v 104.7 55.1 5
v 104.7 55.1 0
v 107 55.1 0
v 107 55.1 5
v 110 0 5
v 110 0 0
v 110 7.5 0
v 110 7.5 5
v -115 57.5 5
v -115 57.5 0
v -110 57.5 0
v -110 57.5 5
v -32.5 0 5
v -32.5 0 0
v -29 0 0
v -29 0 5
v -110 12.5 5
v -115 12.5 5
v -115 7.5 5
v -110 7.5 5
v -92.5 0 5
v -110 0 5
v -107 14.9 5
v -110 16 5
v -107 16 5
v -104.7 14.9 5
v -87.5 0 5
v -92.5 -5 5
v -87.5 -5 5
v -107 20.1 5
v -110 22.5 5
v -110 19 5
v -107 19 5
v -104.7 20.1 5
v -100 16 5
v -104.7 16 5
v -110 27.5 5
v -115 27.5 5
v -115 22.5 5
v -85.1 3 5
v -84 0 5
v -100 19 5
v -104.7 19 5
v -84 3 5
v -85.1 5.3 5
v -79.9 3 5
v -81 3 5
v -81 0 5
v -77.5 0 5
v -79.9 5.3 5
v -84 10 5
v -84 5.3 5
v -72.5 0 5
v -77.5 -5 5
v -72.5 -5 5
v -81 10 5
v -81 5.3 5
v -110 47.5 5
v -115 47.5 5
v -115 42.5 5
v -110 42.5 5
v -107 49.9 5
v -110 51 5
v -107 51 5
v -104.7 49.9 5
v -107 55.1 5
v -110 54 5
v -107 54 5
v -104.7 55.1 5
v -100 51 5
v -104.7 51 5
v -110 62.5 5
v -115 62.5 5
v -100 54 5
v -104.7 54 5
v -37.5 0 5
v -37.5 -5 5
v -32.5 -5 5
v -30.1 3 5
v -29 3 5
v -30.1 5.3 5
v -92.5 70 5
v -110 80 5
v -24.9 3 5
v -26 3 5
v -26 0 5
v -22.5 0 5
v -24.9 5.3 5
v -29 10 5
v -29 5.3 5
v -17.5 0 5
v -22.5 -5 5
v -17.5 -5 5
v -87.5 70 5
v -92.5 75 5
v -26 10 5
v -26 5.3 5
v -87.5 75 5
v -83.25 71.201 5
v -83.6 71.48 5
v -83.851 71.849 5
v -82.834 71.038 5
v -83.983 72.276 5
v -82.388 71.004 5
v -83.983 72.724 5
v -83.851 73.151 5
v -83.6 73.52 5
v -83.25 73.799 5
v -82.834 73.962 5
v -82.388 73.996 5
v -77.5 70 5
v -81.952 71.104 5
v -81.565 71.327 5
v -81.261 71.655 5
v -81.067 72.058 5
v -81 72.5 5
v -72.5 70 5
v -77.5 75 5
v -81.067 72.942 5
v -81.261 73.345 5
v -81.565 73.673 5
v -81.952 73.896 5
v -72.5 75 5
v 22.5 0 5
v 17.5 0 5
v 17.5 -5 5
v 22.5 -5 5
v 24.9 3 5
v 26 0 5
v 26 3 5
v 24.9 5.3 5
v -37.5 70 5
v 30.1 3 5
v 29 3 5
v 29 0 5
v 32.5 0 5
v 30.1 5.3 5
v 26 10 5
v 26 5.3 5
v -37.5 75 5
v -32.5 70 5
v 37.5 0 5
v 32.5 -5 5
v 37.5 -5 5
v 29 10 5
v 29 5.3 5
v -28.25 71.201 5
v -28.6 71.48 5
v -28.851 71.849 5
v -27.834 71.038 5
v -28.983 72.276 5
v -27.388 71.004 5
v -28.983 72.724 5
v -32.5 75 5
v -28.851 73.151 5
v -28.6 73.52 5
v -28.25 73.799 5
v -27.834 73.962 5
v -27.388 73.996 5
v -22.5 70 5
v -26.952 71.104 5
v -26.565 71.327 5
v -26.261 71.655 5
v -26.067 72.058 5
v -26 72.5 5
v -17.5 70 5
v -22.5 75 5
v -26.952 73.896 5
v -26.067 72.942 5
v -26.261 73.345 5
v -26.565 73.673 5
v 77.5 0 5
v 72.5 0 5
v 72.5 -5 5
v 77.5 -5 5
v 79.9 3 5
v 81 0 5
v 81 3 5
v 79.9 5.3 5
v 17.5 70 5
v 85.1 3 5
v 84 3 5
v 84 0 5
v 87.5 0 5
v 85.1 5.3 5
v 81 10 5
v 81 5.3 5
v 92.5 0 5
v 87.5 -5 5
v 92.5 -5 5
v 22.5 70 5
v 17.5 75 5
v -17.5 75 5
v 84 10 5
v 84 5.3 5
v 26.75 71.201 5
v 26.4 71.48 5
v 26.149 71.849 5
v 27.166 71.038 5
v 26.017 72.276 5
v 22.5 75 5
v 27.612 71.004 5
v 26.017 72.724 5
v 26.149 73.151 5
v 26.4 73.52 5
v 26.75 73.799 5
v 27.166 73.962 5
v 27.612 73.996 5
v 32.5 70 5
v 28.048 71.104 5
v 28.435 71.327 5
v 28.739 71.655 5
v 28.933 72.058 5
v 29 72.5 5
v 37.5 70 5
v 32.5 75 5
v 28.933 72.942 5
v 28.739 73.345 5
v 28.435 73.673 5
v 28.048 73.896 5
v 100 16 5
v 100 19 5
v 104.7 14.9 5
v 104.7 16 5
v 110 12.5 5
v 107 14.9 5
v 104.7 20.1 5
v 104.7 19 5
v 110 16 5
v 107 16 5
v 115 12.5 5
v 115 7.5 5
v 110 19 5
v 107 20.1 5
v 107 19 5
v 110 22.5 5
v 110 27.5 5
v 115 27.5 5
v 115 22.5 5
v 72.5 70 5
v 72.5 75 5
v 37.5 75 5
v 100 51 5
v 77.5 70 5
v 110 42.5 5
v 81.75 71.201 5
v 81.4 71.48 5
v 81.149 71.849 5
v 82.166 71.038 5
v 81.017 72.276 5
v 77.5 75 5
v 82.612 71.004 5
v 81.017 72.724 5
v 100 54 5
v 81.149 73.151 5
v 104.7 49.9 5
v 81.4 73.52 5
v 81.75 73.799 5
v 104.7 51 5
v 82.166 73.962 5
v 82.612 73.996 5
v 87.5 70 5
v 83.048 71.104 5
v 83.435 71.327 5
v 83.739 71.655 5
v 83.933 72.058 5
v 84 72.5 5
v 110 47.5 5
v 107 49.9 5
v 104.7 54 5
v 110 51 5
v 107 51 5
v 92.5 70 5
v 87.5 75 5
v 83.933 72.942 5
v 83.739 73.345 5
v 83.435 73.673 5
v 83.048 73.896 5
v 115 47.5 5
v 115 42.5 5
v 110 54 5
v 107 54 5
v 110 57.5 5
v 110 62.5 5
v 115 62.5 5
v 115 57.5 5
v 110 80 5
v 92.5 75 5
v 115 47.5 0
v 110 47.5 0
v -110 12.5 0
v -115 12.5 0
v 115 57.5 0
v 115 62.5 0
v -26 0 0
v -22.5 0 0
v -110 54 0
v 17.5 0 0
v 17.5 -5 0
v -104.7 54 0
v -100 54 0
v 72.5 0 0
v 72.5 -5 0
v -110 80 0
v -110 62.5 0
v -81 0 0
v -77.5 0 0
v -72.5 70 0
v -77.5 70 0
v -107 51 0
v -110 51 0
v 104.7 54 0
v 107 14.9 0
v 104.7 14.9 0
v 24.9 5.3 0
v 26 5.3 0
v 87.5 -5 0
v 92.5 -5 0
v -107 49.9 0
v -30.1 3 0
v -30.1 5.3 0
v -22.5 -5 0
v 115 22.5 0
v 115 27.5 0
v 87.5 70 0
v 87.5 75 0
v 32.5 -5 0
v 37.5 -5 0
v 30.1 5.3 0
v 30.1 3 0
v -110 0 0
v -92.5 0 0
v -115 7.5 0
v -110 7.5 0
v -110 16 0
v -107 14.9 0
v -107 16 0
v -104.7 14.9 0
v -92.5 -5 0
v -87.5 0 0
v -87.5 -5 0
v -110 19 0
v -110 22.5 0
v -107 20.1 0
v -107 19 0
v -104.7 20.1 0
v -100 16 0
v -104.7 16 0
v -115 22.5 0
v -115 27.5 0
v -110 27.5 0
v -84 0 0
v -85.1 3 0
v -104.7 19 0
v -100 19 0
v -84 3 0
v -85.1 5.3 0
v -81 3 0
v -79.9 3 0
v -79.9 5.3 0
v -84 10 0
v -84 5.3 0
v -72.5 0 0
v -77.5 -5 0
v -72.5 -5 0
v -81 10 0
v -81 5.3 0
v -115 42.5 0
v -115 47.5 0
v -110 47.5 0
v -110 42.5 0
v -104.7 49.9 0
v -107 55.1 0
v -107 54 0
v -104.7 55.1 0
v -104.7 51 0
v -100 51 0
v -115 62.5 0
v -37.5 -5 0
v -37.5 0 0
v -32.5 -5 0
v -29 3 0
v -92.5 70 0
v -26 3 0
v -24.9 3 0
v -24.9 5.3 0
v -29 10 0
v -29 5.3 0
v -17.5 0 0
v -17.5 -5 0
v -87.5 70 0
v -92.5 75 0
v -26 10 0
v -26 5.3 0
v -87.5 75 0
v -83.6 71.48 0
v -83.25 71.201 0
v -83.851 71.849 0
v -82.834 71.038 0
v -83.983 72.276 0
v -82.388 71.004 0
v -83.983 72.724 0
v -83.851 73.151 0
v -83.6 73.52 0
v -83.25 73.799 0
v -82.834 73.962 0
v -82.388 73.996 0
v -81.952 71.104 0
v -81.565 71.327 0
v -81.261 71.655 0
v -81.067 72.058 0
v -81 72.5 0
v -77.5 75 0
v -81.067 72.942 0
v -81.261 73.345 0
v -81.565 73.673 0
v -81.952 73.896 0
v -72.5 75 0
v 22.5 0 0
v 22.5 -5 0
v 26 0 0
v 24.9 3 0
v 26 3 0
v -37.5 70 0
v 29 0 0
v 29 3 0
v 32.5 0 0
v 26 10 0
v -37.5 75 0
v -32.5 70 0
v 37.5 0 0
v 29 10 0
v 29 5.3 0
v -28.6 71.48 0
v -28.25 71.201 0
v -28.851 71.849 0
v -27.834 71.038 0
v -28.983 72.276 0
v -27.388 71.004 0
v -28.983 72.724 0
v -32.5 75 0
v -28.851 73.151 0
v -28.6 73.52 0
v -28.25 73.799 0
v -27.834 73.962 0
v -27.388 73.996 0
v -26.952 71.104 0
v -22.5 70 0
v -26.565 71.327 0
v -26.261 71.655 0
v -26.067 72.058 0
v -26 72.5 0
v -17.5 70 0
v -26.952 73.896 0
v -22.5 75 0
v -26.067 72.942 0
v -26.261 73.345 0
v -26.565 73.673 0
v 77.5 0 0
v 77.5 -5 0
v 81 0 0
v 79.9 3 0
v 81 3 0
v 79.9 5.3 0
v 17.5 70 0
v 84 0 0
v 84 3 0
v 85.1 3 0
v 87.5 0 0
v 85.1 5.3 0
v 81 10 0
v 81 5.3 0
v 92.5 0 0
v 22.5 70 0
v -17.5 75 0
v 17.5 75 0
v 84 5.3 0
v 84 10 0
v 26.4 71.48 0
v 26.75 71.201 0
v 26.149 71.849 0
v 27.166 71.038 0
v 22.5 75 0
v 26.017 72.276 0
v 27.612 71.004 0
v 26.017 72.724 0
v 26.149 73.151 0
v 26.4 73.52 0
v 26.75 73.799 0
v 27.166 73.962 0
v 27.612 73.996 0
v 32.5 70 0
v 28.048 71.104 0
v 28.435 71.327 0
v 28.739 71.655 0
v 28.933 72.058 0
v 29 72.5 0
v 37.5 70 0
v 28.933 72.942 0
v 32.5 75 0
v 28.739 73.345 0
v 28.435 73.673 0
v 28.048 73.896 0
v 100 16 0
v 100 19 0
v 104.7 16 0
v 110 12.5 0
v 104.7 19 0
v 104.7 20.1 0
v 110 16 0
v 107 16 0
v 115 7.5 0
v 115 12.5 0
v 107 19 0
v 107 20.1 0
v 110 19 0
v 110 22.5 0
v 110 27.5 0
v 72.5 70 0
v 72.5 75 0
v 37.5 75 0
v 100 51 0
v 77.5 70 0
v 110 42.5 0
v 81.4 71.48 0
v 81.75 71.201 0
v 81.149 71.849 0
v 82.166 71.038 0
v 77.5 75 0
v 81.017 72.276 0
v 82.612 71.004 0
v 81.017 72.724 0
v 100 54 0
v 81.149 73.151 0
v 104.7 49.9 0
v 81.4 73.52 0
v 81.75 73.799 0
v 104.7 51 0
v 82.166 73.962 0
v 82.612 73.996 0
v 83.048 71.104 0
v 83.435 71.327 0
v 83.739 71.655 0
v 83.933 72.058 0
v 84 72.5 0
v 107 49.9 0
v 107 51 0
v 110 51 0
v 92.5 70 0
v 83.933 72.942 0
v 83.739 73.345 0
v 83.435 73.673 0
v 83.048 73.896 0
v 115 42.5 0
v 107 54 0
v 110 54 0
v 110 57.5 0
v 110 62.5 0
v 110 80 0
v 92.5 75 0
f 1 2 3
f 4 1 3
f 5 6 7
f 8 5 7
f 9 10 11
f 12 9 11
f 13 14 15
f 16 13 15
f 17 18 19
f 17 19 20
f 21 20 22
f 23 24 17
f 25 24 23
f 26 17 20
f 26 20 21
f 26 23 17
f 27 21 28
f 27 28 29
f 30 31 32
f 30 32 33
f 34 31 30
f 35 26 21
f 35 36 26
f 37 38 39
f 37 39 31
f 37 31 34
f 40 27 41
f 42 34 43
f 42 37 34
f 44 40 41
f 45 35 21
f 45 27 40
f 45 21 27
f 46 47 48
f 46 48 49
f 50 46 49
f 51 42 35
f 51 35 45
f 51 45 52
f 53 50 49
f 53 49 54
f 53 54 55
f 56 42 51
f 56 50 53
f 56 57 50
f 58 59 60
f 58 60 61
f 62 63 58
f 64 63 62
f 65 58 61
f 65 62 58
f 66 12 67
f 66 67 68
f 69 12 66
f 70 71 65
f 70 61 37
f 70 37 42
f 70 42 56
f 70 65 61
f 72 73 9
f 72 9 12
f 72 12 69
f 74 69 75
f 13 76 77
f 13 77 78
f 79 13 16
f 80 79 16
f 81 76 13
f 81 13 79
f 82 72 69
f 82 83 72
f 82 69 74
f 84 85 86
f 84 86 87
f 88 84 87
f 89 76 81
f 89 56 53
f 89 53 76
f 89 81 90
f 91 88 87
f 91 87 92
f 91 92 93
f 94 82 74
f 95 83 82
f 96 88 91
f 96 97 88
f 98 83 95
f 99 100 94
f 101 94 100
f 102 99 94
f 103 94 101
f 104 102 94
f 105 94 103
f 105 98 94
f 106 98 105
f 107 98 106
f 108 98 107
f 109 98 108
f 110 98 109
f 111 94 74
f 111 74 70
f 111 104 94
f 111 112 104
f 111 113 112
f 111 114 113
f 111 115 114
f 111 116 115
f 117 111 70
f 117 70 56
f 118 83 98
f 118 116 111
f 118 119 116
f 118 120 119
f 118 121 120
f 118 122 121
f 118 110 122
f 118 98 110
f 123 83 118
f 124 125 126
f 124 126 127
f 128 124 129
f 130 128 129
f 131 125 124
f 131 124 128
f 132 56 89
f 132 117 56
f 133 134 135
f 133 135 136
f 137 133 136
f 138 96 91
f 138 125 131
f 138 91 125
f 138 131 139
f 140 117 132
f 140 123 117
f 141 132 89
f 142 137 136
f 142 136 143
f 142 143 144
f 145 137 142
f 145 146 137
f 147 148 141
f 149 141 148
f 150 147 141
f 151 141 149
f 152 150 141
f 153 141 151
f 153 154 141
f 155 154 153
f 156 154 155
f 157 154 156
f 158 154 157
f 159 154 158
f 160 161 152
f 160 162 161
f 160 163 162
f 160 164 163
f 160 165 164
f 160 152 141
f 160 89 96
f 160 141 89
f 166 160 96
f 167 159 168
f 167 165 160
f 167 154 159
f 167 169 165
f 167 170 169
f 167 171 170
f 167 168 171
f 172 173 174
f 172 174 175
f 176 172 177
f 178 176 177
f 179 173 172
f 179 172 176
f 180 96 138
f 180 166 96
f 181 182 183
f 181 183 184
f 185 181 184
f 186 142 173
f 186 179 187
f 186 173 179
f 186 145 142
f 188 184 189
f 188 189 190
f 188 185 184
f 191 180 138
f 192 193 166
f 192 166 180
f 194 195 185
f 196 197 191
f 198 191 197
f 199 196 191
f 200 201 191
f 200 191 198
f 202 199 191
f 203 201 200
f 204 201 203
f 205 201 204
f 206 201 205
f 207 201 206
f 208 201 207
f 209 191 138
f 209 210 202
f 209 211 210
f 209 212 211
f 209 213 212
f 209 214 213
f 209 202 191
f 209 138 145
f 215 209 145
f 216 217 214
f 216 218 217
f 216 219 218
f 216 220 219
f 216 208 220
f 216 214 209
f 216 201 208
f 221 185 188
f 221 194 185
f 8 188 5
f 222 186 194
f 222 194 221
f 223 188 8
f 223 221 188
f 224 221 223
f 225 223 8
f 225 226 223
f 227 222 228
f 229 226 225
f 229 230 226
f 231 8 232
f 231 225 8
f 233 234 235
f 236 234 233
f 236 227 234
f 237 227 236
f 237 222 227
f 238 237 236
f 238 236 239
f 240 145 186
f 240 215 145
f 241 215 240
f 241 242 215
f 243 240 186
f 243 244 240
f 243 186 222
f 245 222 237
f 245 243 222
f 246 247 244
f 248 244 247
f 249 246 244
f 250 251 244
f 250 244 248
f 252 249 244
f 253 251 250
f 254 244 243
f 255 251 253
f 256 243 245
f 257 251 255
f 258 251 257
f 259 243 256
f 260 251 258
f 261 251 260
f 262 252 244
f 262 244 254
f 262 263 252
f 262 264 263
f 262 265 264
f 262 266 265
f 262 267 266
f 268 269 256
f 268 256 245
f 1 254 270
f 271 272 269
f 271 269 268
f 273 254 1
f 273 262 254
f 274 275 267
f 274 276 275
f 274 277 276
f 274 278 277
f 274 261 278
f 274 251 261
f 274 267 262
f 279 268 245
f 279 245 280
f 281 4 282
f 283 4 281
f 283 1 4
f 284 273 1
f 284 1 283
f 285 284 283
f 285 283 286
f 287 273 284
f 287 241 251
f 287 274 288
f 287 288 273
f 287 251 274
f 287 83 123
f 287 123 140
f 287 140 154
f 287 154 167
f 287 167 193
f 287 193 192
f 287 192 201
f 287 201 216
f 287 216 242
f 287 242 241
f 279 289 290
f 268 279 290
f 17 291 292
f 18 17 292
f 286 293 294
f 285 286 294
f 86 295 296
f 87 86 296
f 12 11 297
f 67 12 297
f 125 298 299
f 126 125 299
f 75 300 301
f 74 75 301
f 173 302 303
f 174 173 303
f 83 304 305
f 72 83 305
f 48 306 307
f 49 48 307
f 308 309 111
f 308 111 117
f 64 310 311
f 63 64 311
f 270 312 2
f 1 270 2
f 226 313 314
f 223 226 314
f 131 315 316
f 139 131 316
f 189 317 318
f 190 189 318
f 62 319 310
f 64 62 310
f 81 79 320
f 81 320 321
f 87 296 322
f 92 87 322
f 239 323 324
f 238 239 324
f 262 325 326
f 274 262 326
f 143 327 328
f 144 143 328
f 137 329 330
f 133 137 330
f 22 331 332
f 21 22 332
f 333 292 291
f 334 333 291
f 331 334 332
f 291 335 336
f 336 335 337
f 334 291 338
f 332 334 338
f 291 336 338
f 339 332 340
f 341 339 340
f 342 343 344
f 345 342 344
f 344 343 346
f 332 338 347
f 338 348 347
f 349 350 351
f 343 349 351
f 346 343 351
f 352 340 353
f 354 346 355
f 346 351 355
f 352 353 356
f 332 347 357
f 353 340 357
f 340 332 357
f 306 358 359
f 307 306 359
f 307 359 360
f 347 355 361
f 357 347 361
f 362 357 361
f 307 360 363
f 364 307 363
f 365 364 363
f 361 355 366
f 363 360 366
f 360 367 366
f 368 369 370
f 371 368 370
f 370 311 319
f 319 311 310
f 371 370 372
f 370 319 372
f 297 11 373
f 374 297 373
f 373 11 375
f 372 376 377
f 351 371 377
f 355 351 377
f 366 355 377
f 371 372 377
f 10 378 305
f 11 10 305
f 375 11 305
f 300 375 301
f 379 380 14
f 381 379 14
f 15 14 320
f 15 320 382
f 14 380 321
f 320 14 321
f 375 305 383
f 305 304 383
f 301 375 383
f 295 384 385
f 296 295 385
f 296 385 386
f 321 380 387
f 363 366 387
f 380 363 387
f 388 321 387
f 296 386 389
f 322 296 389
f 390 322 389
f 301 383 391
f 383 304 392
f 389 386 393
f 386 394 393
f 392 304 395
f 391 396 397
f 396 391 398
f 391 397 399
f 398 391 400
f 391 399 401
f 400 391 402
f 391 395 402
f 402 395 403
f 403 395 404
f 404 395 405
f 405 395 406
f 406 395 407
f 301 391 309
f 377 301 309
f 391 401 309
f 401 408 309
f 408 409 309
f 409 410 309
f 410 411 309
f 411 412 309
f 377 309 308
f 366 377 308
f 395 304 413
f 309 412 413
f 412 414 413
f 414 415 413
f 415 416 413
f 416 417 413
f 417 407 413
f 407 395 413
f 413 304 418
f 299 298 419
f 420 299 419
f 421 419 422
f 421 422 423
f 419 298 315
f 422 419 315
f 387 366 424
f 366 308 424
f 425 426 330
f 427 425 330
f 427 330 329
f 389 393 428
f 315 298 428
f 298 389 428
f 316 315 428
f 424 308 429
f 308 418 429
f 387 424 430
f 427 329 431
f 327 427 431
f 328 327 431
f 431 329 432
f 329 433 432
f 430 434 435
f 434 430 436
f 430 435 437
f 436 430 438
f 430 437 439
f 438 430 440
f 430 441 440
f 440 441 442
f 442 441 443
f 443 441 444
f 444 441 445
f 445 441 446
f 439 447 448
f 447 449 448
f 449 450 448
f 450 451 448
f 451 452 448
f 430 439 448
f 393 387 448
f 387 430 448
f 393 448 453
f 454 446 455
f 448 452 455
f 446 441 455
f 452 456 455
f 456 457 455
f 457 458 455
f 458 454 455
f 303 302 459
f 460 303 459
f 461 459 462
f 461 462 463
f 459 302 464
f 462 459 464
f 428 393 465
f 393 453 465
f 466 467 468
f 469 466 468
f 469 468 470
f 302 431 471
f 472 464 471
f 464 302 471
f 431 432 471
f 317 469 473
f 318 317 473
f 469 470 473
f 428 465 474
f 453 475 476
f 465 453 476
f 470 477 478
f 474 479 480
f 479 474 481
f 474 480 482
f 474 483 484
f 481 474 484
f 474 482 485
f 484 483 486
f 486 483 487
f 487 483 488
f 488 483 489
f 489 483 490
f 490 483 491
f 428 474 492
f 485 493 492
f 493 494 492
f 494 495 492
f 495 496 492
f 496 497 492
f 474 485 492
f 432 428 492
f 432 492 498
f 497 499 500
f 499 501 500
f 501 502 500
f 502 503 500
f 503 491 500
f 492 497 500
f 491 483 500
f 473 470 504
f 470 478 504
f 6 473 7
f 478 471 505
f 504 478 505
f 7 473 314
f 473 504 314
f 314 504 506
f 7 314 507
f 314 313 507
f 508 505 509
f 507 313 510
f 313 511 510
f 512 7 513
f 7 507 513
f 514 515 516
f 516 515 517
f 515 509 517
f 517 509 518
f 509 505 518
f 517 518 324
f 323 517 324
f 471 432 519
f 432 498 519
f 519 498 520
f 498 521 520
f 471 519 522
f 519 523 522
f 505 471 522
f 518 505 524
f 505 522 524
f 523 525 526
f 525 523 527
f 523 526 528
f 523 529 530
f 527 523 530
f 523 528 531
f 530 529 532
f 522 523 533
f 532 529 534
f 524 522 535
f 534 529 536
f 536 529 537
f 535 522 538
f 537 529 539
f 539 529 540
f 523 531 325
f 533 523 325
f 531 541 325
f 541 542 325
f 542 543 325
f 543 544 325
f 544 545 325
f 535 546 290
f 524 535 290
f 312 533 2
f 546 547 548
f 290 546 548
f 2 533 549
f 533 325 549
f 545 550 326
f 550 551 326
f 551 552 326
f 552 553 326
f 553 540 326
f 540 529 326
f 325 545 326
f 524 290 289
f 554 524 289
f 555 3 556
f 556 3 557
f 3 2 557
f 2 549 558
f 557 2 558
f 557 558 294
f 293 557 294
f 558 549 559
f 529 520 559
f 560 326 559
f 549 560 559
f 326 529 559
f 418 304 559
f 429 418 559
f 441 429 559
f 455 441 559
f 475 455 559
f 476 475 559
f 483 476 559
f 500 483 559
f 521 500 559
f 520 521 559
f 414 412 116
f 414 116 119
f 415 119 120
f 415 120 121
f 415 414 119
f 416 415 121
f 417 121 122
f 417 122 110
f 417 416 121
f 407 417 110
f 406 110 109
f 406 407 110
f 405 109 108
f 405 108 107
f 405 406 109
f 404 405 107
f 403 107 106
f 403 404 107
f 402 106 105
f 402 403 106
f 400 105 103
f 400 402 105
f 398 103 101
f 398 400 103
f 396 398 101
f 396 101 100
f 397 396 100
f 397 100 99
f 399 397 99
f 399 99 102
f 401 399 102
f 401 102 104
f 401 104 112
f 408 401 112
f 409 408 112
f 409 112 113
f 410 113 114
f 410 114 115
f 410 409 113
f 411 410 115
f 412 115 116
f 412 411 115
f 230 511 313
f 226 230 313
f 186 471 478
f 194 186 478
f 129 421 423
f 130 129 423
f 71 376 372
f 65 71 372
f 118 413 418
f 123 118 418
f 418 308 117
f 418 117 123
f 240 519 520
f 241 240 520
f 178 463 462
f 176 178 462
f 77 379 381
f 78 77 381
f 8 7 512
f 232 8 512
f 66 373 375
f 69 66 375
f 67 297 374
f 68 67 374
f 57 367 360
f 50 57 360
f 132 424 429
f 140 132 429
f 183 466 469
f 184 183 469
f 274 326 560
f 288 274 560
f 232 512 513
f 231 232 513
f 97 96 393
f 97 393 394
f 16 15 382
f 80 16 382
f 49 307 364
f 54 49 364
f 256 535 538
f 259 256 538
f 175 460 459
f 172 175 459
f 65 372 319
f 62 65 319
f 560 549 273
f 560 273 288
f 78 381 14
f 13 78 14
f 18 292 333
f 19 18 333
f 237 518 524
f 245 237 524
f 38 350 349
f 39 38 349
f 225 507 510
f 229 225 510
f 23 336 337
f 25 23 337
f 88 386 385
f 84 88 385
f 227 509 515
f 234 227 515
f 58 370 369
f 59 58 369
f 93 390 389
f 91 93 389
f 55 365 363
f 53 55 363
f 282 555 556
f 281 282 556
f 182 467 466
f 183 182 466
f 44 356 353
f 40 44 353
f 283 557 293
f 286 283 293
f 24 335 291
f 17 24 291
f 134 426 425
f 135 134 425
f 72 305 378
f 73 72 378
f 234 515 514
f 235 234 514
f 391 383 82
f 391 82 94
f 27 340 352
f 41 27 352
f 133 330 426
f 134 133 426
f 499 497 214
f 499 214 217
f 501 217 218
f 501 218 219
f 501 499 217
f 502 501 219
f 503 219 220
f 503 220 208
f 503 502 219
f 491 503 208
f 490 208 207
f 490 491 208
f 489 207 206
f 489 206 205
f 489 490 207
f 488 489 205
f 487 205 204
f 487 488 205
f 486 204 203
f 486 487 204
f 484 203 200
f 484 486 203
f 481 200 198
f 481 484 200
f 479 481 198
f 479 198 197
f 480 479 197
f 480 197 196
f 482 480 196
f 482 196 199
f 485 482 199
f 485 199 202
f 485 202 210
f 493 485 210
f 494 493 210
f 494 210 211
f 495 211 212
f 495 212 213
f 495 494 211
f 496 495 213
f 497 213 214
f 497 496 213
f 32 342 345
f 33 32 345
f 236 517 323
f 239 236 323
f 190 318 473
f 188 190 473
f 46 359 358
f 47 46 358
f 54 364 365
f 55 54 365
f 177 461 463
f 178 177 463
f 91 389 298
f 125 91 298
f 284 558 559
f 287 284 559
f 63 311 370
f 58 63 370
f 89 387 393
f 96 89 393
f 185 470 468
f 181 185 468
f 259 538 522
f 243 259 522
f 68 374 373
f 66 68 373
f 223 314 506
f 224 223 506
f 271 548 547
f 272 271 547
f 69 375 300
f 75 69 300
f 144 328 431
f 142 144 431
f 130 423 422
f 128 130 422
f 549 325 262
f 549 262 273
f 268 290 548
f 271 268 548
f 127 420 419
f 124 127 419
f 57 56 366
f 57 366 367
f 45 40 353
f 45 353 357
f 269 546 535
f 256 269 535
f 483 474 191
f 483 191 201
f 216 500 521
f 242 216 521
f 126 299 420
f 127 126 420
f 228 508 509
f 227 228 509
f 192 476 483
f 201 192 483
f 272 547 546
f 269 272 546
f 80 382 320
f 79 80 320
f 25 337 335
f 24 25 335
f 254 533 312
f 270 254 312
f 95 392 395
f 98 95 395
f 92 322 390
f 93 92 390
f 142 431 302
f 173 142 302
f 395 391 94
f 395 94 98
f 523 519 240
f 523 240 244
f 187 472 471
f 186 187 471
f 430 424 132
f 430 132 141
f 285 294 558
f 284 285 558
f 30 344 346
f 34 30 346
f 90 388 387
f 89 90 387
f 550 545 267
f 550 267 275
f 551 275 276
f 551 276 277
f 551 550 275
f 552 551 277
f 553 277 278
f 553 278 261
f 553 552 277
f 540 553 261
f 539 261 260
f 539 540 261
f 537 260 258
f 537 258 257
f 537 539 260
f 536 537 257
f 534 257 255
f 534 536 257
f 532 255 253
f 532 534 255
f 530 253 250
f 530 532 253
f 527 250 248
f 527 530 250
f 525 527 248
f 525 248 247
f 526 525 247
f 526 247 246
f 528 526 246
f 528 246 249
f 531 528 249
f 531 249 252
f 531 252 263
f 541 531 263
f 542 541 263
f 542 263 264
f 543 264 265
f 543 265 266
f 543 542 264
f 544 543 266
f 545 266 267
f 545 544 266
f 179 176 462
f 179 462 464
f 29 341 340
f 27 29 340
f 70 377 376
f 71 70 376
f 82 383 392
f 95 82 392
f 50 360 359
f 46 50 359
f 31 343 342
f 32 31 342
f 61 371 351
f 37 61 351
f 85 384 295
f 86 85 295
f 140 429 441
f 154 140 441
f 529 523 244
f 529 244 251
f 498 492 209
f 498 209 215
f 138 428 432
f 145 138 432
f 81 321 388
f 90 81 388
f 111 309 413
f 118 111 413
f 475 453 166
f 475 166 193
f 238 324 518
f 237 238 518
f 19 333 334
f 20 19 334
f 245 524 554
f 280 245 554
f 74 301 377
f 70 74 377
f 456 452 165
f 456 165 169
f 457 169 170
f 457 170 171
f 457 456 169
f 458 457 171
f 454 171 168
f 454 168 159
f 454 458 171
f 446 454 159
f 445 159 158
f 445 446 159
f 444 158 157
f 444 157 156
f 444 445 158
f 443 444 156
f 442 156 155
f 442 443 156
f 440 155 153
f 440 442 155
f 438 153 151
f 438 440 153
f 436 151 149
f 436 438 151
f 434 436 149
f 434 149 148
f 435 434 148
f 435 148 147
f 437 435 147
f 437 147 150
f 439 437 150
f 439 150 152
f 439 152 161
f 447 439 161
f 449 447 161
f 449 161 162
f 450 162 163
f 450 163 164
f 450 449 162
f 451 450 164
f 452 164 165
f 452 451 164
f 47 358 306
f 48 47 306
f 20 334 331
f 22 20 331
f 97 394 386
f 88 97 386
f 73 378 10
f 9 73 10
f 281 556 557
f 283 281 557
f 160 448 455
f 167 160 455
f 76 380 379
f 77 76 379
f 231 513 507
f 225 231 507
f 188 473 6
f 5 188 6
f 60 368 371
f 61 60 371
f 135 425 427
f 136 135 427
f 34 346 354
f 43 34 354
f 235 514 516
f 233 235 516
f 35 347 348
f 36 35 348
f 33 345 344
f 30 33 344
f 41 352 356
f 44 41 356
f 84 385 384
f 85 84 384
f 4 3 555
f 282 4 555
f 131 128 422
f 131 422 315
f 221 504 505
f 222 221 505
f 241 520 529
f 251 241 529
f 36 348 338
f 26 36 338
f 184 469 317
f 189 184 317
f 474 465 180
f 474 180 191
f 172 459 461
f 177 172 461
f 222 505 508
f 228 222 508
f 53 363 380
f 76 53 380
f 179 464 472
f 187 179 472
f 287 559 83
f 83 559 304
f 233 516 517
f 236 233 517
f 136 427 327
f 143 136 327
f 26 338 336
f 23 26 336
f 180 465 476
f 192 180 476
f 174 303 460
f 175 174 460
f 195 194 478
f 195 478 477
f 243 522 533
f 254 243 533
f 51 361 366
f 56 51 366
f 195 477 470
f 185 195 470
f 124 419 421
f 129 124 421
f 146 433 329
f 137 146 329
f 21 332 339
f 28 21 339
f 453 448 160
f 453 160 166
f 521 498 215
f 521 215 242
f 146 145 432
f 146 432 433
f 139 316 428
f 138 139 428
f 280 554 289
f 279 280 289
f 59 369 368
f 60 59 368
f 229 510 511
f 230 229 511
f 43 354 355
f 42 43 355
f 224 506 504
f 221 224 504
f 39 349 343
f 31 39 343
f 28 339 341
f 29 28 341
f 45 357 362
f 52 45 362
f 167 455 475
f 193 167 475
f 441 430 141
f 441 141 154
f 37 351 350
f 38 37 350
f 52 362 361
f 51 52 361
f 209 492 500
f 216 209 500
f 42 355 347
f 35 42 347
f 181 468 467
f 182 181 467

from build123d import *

# Parameters (mm, degrees)
SKETCH1_W           = 5
SKETCH1_H           = 5
SKETCH1_R           = 1.5
BOSS_EXTRUDE2_DEPTH = 5


with BuildPart() as part:
    # Sketch1 → Boss-Extrude2 (new body)
    with BuildSketch(Plane.XY):
        Polygon((-110, 80), (-110, 62.5), (-115, 62.5), (-115, 57.5), (-110, 57.5), (-110, 54), (-107, 54), (-107, 55.1), (-104.7, 55.1), (-104.7, 54), (-100, 54), (-100, 51), (-104.7, 51), (-104.7, 49.9), (-107, 49.9), (-107, 51), (-110, 51), (-110, 47.5), (-115, 47.5), (-115, 42.5), (-110, 42.5), (-110, 27.5), (-115, 27.5), (-115, 22.5), (-110, 22.5), (-110, 19), (-107, 19), (-107, 20.1), (-104.7, 20.1), (-104.7, 19), (-100, 19), (-100, 16), (-104.7, 16), (-104.7, 14.9), (-107, 14.9), (-107, 16), (-110, 16), (-110, 12.5), (-115, 12.5), (-115, 7.5), (-110, 7.5), (-110, 0), (-92.5, 0), (-92.5, -5), (-87.5, -5), (-87.5, 0), (-84, 0), (-84, 3), (-85.1, 3), (-85.1, 5.3), (-84, 5.3), (-84, 10), (-81, 10), (-81, 5.3), (-79.9, 5.3), (-79.9, 3), (-81, 3), (-81, 0), (-77.5, 0), (-77.5, -5), (-72.5, -5), (-72.5, 0), (-37.5, 0), (-37.5, -5), (-32.5, -5), (-32.5, 0), (-29, 0), (-29, 3), (-30.1, 3), (-30.1, 5.3), (-29, 5.3), (-29, 10), (-26, 10), (-26, 5.3), (-24.9, 5.3), (-24.9, 3), (-26, 3), (-26, 0), (-22.5, 0), (-22.5, -5), (-17.5, -5), (-17.5, 0), (17.5, 0), (17.5, -5), (22.5, -5), (22.5, 0), (26, 0), (26, 3), (24.9, 3), (24.9, 5.3), (26, 5.3), (26, 10), (29, 10), (29, 5.3), (30.1, 5.3), (30.1, 3), (29, 3), (29, 0), (32.5, 0), (32.5, -5), (37.5, -5), (37.5, 0), (72.5, 0), (72.5, -5), (77.5, -5), (77.5, 0), (81, 0), (81, 3), (79.9, 3), (79.9, 5.3), (81, 5.3), (81, 10), (84, 10), (84, 5.3), (85.1, 5.3), (85.1, 3), (84, 3), (84, 0), (87.5, 0), (87.5, -5), (92.5, -5), (92.5, 0), (110, 0), (110, 7.5), (115, 7.5), (115, 12.5), (110, 12.5), (110, 16), (107, 16), (107, 14.9), (104.7, 14.9), (104.7, 16), (100, 16), (100, 19), (104.7, 19), (104.7, 20.1), (107, 20.1), (107, 19), (110, 19), (110, 22.5), (115, 22.5), (115, 27.5), (110, 27.5), (110, 42.5), (115, 42.5), (115, 47.5), (110, 47.5), (110, 51), (107, 51), (107, 49.9), (104.7, 49.9), (104.7, 51), (100, 51), (100, 54), (104.7, 54), (104.7, 55.1), (107, 55.1), (107, 54), (110, 54), (110, 57.5), (115, 57.5), (115, 62.5), (110, 62.5), (110, 80), align=None)
        with Locations((-90, 72.5)):
            Rectangle(SKETCH1_W, SKETCH1_H, mode=Mode.SUBTRACT)
        with Locations((-82.5, 72.5)):
            Circle(SKETCH1_R, mode=Mode.SUBTRACT)
        with Locations((-75, 72.5)):
            Rectangle(SKETCH1_W, SKETCH1_H, mode=Mode.SUBTRACT)
        with Locations((-35, 72.5)):
            Rectangle(SKETCH1_W, SKETCH1_H, mode=Mode.SUBTRACT)
        with Locations((-27.5, 72.5)):
            Circle(SKETCH1_R, mode=Mode.SUBTRACT)
        with Locations((-20, 72.5)):
            Rectangle(SKETCH1_W, SKETCH1_H, mode=Mode.SUBTRACT)
        with Locations((20, 72.5)):
            Rectangle(SKETCH1_W, SKETCH1_H, mode=Mode.SUBTRACT)
        with Locations((27.5, 72.5)):
            Circle(SKETCH1_R, mode=Mode.SUBTRACT)
        with Locations((35, 72.5)):
            Rectangle(SKETCH1_W, SKETCH1_H, mode=Mode.SUBTRACT)
        with Locations((75, 72.5)):
            Rectangle(SKETCH1_W, SKETCH1_H, mode=Mode.SUBTRACT)
        with Locations((82.5, 72.5)):
            Circle(SKETCH1_R, mode=Mode.SUBTRACT)
        with Locations((90, 72.5)):
            Rectangle(SKETCH1_W, SKETCH1_H, mode=Mode.SUBTRACT)
    extrude(amount=BOSS_EXTRUDE2_DEPTH)


solid = part.part
